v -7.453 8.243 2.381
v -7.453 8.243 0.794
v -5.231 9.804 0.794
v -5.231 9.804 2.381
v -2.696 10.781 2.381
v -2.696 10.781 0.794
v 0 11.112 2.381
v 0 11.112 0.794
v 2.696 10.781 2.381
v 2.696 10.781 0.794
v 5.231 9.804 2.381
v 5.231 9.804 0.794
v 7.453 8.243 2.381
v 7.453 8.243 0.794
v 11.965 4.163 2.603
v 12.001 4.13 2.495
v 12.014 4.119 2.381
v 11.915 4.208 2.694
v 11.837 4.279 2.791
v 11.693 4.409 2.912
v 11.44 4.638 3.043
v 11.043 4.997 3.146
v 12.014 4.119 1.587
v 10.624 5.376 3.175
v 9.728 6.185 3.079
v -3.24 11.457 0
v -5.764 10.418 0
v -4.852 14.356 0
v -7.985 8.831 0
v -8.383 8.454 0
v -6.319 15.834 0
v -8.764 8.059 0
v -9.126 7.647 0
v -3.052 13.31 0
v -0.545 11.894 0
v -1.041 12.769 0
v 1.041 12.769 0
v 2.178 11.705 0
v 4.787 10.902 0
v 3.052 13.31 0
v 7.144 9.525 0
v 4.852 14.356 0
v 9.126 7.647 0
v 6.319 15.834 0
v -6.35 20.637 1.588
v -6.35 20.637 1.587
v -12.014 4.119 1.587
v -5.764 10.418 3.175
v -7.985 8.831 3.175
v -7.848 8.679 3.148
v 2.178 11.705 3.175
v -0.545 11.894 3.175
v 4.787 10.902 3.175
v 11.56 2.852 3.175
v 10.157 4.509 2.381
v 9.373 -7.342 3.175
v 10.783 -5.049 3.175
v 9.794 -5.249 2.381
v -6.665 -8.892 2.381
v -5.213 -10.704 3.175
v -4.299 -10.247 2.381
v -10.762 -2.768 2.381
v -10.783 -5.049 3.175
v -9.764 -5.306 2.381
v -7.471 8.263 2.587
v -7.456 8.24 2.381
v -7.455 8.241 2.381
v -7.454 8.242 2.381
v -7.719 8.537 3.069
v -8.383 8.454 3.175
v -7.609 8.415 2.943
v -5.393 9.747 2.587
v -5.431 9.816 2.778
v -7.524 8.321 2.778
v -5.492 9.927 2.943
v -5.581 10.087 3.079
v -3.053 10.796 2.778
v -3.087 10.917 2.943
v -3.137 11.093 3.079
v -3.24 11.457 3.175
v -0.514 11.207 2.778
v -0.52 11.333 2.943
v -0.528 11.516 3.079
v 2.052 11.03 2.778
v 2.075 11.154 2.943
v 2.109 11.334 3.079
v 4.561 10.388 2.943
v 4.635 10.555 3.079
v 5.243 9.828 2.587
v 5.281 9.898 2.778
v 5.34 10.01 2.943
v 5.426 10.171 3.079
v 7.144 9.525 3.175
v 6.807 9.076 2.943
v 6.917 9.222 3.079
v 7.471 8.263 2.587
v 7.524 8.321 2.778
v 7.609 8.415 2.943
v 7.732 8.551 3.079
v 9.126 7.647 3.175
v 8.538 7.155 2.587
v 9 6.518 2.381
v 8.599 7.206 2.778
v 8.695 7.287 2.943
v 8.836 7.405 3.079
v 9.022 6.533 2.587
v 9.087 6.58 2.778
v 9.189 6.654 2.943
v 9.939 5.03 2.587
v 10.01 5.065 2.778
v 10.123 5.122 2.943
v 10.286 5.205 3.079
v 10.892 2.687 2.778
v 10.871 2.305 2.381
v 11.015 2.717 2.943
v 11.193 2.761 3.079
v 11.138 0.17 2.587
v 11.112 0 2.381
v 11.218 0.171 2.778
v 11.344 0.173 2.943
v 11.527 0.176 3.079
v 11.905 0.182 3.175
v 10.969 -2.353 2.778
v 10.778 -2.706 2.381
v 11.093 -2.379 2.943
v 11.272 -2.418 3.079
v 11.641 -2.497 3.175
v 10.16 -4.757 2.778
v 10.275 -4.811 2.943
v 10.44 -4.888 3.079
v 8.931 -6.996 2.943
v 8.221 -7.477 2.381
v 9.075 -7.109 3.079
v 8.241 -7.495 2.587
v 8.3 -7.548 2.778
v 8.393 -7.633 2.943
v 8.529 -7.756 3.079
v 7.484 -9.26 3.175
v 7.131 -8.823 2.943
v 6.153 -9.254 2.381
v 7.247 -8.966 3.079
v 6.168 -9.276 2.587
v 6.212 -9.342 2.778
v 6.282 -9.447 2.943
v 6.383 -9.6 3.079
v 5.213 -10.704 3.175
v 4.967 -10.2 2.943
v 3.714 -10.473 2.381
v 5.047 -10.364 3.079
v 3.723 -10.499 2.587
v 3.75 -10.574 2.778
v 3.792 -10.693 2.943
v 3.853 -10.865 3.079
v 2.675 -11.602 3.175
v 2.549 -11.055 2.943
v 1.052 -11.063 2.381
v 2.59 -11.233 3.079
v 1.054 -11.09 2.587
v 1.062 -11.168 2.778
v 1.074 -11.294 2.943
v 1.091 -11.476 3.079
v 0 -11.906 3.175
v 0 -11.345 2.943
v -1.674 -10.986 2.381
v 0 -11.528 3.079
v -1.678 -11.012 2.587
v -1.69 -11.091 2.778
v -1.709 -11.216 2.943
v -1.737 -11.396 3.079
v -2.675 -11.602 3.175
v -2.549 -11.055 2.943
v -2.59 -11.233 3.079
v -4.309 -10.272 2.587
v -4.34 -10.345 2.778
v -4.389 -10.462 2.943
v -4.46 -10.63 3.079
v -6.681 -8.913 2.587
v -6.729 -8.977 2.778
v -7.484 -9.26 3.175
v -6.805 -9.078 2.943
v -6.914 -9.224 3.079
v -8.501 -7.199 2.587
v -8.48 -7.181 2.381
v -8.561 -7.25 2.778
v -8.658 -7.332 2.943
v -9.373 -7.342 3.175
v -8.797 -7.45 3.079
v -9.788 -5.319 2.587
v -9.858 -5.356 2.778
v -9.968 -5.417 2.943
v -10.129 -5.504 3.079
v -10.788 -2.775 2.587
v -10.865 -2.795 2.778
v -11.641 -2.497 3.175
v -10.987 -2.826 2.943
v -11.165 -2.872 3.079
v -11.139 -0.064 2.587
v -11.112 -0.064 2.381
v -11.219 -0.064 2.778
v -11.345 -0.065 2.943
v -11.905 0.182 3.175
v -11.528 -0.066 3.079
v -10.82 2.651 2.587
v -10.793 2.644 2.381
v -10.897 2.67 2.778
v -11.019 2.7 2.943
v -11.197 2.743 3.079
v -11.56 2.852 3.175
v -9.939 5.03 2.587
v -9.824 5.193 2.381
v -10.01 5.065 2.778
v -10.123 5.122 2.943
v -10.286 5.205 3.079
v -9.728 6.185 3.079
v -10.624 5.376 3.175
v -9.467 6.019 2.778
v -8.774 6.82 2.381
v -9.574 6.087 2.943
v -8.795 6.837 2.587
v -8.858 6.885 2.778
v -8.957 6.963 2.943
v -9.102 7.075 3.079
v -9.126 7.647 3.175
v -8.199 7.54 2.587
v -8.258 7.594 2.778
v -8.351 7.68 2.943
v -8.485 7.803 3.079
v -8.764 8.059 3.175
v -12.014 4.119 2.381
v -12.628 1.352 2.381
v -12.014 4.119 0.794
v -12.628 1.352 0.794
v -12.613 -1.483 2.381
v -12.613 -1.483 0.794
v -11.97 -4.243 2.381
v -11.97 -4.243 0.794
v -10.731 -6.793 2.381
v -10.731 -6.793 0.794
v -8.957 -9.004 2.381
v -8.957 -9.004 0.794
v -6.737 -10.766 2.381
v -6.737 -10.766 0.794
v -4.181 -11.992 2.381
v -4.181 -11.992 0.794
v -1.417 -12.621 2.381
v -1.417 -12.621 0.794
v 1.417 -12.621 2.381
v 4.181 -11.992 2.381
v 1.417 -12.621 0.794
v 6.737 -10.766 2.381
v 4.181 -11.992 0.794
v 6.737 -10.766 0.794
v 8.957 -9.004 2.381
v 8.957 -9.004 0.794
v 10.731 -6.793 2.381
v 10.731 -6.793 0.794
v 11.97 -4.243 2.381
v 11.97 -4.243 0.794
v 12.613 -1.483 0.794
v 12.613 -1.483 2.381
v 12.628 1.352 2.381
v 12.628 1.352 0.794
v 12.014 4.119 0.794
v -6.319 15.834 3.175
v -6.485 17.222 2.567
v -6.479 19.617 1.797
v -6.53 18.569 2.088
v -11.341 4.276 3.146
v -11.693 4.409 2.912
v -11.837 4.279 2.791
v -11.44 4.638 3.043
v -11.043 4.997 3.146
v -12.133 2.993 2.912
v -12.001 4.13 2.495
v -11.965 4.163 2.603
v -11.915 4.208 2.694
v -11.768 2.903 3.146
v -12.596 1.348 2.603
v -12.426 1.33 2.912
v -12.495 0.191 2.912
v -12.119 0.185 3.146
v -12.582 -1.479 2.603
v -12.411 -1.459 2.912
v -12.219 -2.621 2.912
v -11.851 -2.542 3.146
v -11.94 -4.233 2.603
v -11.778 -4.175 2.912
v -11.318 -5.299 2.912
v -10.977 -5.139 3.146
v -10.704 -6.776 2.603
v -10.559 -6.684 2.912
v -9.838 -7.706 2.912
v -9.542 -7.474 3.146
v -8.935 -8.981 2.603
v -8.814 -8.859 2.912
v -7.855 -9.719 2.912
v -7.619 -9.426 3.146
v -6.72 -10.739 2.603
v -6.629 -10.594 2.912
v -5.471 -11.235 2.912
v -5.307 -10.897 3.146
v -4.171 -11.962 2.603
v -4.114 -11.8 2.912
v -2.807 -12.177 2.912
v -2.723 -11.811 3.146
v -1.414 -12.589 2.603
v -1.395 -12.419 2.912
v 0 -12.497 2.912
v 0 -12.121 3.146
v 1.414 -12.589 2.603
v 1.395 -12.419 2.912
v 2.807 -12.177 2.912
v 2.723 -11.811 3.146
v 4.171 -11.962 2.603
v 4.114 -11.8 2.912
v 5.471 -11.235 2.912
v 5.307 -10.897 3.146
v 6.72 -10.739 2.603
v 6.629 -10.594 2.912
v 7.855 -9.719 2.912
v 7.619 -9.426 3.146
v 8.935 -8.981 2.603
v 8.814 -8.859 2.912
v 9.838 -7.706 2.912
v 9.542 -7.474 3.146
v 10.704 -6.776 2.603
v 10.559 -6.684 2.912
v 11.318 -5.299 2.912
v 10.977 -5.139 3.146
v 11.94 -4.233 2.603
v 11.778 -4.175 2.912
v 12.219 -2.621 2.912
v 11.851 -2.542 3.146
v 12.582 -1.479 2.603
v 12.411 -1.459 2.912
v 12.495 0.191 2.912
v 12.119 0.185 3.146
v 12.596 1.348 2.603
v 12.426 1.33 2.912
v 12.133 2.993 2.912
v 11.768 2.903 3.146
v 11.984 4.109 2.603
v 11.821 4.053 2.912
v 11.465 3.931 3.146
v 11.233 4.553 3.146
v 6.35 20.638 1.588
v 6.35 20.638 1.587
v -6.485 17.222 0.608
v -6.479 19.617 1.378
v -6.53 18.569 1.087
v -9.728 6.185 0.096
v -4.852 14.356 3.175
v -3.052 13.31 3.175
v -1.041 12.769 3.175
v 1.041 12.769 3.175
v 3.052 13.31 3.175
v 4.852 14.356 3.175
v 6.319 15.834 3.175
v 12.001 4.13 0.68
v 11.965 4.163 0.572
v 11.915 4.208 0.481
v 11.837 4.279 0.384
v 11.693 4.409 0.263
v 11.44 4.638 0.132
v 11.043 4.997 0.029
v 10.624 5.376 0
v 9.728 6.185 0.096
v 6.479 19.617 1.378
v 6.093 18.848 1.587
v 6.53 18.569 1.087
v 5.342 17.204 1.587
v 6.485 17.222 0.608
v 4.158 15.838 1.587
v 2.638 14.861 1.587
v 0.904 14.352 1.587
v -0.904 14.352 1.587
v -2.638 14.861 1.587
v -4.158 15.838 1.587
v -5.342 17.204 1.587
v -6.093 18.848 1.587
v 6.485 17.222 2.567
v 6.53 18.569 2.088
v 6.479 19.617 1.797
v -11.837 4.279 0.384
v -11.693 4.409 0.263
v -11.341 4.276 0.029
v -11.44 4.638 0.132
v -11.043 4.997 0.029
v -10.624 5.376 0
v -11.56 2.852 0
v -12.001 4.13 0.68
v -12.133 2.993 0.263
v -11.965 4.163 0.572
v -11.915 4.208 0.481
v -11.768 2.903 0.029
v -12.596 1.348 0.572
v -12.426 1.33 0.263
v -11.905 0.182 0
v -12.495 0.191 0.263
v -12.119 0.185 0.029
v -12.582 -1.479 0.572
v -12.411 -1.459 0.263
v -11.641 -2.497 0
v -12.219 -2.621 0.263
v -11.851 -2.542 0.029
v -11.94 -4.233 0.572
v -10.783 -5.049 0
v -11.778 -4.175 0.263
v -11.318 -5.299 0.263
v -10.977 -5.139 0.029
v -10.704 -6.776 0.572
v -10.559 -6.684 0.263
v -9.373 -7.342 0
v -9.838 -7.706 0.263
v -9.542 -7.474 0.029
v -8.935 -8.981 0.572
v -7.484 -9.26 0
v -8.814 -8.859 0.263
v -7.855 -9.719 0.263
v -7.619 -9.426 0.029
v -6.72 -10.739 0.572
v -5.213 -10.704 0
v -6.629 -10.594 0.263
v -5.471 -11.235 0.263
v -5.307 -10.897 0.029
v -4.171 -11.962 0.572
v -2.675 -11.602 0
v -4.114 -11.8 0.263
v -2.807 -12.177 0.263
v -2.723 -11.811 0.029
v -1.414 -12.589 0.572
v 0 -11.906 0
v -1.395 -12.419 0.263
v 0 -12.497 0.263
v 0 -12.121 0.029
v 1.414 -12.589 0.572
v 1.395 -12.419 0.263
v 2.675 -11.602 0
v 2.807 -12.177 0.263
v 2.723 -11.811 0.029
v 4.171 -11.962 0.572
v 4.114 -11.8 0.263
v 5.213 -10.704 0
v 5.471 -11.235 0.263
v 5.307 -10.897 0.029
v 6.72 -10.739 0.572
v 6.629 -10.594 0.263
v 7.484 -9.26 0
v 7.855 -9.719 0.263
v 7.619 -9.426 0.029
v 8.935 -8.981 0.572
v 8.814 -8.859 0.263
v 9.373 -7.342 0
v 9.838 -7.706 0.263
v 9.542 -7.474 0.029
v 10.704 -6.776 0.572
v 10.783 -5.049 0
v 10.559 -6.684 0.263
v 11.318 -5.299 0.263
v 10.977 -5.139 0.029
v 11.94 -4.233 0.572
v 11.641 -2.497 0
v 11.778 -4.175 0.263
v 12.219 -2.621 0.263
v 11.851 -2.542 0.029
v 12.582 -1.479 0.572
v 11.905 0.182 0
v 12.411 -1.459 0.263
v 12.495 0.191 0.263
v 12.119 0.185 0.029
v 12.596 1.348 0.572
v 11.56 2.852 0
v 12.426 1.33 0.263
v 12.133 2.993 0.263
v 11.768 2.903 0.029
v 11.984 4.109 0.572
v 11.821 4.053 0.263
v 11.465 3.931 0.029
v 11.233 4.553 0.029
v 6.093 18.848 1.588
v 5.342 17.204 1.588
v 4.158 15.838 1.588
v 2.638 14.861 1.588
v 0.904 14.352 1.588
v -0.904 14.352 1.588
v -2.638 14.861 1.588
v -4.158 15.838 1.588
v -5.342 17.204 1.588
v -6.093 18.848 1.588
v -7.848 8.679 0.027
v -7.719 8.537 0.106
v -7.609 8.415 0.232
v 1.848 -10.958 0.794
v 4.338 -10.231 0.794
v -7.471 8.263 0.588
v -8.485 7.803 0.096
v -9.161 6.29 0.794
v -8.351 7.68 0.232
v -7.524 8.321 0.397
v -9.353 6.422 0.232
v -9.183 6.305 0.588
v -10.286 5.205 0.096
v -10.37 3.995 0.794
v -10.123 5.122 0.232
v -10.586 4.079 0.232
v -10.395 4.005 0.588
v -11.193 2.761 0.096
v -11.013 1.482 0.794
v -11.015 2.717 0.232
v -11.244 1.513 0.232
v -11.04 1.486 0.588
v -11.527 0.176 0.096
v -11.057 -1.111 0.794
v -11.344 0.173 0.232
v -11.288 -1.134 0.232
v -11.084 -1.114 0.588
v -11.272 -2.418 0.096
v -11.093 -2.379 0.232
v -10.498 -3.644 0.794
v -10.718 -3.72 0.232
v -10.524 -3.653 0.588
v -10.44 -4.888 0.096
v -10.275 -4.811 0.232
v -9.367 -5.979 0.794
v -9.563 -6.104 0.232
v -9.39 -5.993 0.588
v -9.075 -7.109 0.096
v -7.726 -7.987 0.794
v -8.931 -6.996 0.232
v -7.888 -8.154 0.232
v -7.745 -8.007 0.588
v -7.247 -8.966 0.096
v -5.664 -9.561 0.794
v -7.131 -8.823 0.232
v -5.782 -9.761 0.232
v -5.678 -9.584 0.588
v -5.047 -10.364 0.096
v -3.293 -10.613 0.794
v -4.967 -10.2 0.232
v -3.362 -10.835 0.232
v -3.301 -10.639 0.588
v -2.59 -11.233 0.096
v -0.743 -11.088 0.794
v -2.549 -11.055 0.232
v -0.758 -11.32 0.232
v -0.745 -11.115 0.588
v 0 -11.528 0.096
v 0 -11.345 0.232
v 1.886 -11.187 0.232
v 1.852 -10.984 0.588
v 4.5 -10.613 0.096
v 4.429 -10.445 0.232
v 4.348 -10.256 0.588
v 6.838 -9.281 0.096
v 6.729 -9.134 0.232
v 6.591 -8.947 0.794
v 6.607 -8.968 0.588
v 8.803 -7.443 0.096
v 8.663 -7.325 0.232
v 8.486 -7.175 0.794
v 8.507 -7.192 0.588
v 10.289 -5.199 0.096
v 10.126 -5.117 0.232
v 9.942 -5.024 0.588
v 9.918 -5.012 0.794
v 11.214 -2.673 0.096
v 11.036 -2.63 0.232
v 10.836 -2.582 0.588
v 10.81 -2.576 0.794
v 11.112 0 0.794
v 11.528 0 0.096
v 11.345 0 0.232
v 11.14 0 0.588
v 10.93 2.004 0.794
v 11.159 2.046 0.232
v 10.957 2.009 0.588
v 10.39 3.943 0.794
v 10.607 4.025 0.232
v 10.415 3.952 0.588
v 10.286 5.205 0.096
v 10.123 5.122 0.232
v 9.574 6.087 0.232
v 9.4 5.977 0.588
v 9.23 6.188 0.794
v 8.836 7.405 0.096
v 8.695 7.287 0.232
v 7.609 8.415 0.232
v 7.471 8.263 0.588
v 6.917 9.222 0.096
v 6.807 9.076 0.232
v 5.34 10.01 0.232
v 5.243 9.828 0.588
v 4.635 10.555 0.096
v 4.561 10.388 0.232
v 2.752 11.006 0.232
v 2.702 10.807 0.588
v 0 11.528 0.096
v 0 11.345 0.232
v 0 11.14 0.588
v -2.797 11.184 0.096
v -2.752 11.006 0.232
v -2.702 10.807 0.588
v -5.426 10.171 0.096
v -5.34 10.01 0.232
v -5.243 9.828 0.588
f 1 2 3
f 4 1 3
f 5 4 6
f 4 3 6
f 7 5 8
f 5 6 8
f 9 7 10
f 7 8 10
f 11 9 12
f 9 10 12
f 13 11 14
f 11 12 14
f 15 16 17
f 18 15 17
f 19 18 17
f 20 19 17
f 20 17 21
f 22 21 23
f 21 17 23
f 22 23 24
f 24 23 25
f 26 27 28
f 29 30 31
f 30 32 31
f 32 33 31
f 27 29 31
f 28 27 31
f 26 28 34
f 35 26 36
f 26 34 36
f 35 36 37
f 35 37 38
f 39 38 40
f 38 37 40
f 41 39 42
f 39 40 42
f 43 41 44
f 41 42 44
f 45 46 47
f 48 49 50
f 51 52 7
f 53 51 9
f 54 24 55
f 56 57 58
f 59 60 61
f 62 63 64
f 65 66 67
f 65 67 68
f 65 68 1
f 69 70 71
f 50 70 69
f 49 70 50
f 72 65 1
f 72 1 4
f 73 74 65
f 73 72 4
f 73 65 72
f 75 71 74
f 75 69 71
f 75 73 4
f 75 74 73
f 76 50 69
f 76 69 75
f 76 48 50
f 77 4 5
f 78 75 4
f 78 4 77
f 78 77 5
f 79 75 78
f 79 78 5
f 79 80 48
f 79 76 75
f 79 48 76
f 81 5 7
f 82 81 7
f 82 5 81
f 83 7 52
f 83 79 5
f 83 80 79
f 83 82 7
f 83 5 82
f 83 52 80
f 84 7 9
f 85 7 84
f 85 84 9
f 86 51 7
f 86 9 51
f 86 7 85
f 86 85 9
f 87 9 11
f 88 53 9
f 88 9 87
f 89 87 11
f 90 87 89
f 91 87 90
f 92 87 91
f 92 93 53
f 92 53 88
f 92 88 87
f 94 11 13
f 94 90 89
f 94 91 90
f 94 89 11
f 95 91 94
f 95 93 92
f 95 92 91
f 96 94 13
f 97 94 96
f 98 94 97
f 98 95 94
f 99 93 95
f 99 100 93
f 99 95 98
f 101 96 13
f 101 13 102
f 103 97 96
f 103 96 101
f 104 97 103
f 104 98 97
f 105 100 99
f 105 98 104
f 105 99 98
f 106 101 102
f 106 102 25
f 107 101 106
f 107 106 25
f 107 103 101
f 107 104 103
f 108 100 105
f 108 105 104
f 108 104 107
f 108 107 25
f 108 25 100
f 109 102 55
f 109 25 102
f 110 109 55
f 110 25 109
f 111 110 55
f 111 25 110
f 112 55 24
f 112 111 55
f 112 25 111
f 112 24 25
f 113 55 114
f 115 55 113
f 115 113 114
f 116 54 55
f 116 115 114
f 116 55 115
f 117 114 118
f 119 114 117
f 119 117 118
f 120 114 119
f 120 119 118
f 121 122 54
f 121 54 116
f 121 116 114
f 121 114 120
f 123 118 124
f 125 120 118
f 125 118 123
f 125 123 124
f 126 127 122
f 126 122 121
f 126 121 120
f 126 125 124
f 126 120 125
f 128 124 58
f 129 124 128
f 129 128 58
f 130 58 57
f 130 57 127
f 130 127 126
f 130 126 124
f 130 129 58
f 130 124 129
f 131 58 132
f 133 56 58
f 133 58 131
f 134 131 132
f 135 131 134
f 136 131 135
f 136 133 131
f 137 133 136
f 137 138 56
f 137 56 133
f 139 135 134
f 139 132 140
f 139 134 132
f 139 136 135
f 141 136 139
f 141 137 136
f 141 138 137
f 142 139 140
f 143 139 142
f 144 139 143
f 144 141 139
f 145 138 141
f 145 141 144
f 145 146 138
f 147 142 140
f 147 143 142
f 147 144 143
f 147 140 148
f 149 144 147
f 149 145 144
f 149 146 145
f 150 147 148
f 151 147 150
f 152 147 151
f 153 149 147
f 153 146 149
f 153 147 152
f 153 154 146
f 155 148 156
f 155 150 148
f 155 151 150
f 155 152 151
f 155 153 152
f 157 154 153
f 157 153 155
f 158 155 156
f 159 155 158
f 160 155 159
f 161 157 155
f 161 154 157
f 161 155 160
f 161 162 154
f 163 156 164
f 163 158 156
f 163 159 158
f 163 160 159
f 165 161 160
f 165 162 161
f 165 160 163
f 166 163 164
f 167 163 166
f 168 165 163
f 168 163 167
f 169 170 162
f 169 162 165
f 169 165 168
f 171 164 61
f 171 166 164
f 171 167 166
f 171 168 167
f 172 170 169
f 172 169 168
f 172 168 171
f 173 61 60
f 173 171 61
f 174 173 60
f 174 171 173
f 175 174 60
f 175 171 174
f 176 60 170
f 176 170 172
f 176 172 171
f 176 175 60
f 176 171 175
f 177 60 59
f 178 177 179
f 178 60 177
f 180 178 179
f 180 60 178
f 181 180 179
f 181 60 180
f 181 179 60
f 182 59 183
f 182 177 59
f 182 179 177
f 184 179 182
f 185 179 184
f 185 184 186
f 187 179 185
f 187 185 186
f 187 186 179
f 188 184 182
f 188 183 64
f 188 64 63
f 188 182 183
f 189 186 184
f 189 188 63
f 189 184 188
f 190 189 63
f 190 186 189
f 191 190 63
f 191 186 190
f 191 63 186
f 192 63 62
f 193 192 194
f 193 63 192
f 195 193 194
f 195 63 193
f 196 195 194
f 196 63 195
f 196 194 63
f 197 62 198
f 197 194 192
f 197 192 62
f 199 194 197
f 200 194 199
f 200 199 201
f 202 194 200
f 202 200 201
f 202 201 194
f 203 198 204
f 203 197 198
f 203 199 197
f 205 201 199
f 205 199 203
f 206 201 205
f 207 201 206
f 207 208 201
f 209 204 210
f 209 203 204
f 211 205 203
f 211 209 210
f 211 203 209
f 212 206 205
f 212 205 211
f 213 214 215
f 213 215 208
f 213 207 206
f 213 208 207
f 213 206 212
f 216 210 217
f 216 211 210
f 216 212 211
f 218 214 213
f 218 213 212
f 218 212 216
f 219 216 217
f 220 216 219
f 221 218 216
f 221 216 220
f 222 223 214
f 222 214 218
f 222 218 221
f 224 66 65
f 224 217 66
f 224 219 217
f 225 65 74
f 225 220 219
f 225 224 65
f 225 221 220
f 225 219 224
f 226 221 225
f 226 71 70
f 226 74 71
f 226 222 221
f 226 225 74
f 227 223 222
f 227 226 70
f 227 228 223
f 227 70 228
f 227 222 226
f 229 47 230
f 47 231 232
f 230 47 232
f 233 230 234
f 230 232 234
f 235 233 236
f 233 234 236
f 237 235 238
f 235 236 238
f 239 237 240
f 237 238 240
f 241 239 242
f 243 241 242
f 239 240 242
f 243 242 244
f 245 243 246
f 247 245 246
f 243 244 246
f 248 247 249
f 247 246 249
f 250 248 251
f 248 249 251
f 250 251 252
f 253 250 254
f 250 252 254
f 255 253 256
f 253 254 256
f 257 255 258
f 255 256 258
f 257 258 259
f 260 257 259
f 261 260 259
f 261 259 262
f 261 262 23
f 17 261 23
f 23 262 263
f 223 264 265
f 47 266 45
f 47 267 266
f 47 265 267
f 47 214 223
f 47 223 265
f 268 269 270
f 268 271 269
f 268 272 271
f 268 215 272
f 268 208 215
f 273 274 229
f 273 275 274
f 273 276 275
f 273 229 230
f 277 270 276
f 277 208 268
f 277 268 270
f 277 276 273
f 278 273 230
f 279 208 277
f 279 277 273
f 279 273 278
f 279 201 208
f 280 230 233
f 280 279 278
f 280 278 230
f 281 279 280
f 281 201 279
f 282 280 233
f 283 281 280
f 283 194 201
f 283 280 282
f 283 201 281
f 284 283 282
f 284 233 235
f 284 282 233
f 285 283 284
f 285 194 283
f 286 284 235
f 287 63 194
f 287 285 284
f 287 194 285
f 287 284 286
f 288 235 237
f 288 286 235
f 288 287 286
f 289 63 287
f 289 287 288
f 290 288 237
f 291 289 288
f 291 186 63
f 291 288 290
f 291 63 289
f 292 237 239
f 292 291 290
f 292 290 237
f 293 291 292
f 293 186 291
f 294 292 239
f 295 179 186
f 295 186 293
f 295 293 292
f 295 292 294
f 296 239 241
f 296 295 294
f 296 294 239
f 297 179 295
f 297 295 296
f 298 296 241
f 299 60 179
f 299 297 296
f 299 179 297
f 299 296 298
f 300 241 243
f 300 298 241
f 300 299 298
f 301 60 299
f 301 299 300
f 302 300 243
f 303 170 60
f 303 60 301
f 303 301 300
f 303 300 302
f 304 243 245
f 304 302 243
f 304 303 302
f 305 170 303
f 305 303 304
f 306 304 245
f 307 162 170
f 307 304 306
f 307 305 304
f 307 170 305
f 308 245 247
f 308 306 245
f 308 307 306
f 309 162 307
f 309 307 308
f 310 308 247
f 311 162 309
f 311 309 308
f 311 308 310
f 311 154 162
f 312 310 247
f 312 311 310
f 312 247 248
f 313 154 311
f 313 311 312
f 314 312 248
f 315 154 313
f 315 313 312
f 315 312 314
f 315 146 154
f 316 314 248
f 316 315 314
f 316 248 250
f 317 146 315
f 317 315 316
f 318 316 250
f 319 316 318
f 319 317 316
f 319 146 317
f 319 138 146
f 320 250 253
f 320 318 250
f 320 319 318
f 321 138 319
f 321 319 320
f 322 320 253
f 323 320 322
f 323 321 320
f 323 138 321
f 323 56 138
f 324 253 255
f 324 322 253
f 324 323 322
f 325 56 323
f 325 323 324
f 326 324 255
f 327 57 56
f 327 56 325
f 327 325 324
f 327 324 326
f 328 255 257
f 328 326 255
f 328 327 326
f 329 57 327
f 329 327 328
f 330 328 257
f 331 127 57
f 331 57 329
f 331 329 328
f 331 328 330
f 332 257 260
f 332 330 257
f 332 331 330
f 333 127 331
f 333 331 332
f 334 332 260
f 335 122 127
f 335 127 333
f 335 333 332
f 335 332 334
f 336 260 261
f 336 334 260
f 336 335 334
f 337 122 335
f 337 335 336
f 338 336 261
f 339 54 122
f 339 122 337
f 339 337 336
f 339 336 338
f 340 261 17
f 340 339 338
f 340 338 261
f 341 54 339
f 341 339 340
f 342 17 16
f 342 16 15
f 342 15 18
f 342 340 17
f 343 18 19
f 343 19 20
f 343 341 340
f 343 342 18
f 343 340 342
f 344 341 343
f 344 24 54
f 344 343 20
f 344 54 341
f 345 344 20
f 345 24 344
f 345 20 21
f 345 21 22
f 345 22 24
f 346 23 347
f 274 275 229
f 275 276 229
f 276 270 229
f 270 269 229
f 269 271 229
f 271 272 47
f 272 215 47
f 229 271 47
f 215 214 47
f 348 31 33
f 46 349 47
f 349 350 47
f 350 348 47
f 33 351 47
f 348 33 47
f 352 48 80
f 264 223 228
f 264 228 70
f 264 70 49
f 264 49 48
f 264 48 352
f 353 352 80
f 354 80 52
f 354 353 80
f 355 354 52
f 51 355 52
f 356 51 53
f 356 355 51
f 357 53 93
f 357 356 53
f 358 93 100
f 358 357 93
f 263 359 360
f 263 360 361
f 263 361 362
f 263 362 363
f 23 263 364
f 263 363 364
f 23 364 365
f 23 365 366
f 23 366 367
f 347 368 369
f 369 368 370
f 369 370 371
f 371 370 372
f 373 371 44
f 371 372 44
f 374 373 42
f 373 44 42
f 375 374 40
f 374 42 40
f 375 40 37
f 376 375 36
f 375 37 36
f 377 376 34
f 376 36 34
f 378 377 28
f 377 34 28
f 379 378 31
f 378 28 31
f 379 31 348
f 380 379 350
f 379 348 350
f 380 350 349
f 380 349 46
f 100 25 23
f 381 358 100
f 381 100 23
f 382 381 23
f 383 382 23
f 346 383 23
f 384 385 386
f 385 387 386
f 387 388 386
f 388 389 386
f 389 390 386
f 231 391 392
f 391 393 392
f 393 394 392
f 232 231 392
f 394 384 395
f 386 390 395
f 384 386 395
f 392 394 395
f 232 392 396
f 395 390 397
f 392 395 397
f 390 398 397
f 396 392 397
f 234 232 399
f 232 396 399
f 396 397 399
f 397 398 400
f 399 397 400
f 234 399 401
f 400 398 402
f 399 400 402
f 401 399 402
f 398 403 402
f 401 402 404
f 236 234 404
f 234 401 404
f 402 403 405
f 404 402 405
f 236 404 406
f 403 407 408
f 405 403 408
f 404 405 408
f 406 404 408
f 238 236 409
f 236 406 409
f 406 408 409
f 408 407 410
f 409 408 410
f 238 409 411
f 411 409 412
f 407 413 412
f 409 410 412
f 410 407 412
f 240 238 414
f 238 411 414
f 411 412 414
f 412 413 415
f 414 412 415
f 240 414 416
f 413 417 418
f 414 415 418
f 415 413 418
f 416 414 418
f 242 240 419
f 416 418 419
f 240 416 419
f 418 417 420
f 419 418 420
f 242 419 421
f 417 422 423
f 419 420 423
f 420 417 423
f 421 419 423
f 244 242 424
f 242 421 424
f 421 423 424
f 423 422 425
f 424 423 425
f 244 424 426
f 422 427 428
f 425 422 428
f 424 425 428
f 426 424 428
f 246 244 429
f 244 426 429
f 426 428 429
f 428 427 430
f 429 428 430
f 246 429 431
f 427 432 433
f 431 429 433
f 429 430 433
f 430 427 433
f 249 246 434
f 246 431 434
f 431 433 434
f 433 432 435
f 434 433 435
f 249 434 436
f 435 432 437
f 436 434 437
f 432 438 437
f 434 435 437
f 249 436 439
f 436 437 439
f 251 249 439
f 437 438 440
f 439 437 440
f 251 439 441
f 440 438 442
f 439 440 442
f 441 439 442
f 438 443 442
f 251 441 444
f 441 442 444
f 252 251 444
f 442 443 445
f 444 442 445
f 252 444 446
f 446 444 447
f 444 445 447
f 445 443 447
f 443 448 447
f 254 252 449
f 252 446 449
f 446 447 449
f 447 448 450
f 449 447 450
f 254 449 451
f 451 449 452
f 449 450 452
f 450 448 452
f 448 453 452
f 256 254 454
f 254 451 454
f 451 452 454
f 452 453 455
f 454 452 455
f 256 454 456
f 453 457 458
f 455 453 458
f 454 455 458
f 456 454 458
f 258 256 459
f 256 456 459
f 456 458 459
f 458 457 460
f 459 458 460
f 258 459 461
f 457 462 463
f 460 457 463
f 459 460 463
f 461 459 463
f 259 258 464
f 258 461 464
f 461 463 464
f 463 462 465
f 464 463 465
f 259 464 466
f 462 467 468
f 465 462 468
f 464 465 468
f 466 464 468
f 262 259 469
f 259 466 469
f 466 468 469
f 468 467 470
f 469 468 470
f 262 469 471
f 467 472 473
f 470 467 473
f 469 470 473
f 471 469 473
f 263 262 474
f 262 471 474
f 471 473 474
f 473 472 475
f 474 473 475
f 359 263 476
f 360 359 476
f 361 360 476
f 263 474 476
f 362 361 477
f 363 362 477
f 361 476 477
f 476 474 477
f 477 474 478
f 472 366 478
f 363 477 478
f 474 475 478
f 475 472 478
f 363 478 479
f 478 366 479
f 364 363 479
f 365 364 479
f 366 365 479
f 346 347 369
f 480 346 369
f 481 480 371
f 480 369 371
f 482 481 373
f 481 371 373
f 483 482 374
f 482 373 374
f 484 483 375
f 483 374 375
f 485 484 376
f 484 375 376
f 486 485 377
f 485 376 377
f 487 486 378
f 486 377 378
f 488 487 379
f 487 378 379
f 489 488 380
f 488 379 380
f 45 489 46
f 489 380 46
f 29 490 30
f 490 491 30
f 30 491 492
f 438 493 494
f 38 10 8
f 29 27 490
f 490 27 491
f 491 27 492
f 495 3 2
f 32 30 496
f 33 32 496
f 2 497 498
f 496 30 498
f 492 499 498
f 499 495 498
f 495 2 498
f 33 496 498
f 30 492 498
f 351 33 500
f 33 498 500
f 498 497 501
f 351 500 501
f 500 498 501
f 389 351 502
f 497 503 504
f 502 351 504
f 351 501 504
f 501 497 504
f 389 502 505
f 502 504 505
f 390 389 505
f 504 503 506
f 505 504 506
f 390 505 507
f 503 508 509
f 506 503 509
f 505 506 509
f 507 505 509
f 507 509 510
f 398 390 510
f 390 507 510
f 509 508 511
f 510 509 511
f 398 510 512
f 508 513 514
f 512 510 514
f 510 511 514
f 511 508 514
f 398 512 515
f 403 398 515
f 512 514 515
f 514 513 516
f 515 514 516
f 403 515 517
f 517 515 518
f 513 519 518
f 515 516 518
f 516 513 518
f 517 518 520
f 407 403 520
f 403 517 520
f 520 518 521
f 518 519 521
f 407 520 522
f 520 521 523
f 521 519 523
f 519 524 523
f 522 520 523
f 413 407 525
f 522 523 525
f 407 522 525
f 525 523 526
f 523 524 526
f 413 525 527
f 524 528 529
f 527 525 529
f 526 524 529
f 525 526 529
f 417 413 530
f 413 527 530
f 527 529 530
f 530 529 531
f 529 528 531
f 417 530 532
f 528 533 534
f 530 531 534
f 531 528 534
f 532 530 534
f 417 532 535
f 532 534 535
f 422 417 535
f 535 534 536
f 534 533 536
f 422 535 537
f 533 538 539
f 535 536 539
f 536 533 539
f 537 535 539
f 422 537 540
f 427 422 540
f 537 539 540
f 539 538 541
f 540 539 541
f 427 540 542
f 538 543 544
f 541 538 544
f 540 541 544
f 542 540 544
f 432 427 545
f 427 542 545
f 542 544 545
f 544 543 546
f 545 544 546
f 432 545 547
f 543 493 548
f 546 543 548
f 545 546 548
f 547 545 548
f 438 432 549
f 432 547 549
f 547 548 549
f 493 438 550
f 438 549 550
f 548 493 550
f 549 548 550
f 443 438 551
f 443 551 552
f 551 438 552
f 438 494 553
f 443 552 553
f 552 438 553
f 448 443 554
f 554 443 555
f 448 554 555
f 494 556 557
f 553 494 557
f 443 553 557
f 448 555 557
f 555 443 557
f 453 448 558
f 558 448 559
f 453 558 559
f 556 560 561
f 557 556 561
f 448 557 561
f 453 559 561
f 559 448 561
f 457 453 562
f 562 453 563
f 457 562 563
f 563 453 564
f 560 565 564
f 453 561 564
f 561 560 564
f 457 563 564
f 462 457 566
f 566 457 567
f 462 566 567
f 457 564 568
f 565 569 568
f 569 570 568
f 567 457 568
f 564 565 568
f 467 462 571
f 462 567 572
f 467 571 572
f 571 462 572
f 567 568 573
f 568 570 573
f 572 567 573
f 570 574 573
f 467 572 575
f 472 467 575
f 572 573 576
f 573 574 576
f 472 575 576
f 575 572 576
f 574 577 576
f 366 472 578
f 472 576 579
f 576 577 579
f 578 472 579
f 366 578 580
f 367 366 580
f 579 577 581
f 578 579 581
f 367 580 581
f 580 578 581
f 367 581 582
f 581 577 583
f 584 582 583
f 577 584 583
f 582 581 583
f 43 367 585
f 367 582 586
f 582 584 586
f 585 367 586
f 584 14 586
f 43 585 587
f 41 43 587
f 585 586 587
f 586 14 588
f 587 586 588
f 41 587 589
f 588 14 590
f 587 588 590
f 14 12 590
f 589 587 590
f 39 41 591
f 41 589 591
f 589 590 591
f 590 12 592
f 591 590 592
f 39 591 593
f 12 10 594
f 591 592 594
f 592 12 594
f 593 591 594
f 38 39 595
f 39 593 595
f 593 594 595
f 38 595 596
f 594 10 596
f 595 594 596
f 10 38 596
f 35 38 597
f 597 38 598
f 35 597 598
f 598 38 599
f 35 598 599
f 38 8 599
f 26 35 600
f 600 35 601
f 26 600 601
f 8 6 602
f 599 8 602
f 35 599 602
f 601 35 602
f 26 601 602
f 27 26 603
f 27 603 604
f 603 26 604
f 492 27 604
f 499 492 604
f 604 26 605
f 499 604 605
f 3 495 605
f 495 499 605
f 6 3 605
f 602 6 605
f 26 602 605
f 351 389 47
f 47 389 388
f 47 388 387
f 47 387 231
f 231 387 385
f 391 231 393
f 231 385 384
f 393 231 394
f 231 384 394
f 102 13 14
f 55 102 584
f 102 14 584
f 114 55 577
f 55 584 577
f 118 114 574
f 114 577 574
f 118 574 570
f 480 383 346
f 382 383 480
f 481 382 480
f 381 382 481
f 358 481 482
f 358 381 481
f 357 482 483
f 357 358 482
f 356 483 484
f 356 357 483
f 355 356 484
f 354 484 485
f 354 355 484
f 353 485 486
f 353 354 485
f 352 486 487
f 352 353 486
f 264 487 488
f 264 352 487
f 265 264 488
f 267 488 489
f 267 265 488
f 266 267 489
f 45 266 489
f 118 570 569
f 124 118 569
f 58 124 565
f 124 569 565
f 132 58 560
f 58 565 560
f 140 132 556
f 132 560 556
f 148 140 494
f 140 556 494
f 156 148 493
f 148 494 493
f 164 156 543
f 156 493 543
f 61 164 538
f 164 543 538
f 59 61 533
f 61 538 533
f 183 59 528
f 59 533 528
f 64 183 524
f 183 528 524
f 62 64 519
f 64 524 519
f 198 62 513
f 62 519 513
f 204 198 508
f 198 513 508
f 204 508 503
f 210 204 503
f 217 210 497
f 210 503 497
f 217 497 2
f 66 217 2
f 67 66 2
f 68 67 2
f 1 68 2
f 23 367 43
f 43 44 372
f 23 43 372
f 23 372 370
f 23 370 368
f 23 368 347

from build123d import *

# Parameters (mm, degrees)
F1_DEPTH    = 3.175
F2_SIZE     = 1.58749
F3_DEPTH    = 3.175
F4_T6_ANGLE = 235.7964191348
F4_T8_ANGLE = 235.7964191348


# Not quite as in the source:
# - a fillet or chamfer that OpenCascade refuses, or shapes differently, is made with other operations: its cross-section is extruded or revolved along the edge and cut away or added
# - a fillet or chamfer is up to 0.001 mm smaller than in the source, because OpenCascade refuses the exact size


with BuildPart() as f1:
    # F0 (on Top) → F1 (new body)
    with BuildSketch(Plane.XY):
        with BuildLine():
            ThreePointArc((-7.4530411175, 8.2425623656), (0, 11.1125), (7.4530411175, 8.2425623656))
            Line((7.4530411175, 8.2425623656), (12.0135135135, 4.1189189189))
            Line((12.0135135135, 4.1189189189), (6.35, 20.6375))
            ThreePointArc((6.35, 20.6375), (0, 14.2875), (-6.35, 20.6375))
            Line((-6.35, 20.6375), (-12.0135135135, 4.1189189189))
            Line((-12.0135135135, 4.1189189189), (-7.4530411175, 8.2425623656))
        make_face()
    extrude(amount=F1_DEPTH)

    # F2 (size 1.5875 in the source; OpenCascade refuses exactly that, so slightly less here)
    f2_edges = [f1.edges().sort_by_distance(p)[0] for p in [
        (-9.181757, 12.378209, 3.175),
        (-9.181757, 12.378209, 0),
        (0, 14.2875, 0),
        (0, 14.2875, 3.175),
        (9.181757, 12.378209, 3.175),
        (9.181757, 12.378209, 0),
    ]]
    chamfer(f2_edges, length=F2_SIZE)

    # F0 (on Top) → F3 (join)
    with BuildSketch(Plane.XY):
        with BuildLine():
            ThreePointArc((7.4530411175, 8.2425623656), (10.1565145515, 4.509198201), (11.1125, 0))
            ThreePointArc((11.1125, 0), (-4.509198201, -10.1565145515), (-7.4530411175, 8.2425623656))
            Line((-7.4530411175, 8.2425623656), (-12.0135135135, 4.1189189189))
            ThreePointArc((-12.0135135135, 4.1189189189), (0, -12.7), (12.0135135135, 4.1189189189))
            Line((12.0135135135, 4.1189189189), (7.4530411175, 8.2425623656))
        make_face()
    extrude(amount=F3_DEPTH)

    # F4: fillet of radius 0.79375 on 4 edges, made by hand

    # F4_s1 → F4_t2 (revolve, cut)
    with BuildSketch(Plane(origin=(0, 0, 0), x_dir=(0, 0, 1), z_dir=(-0.7417378957, -0.6706898643, 0))):
        with BuildLine():
            ThreePointArc((2.38125, 11.1125), (2.9425160076, 11.3449839924), (3.175, 11.90625))
            Line((3.175, 11.90625), (3.175, 11.1125))
            Line((3.175, 11.1125), (2.38125, 11.1125))
        make_face()
    revolve(axis=Axis((0, 0, 3.175), (0, 0, -1)), mode=Mode.SUBTRACT)

    # F4_s3 → F4_t4 (revolve, cut)
    with BuildSketch(Plane(origin=(0, 0, 0), x_dir=(0, 0, 1), z_dir=(0.7417378957, 0.6706898643, 0))):
        with BuildLine():
            ThreePointArc((0, -11.90625), (0.2324839924, -11.3449839924), (0.79375, -11.1125))
            Line((0.79375, -11.1125), (0, -11.1125))
            Line((0, -11.1125), (0, -11.90625))
        make_face()
    revolve(axis=Axis((0, 0, 0), (0, 0, 1)), mode=Mode.SUBTRACT)

    # F4_s5 → F4_t6 (revolve, cut)
    with BuildSketch(Plane(origin=(0, 0, 0), x_dir=(0, 0, 1), z_dir=(0.4679021973, 0.883780252, 0))):
        with BuildLine():
            ThreePointArc((0.79375, -12.7), (0.2324839924, -12.4675160076), (0, -11.90625))
            Line((0, -11.90625), (0, -12.7))
            Line((0, -12.7), (0.79375, -12.7))
        make_face()
    revolve(axis=Axis((0, 0, 0), (0, 0, 1)), revolution_arc=F4_T6_ANGLE, mode=Mode.SUBTRACT)

    # F4_s7 → F4_t8 (revolve, cut)
    with BuildSketch(Plane(origin=(0, 0, 0), x_dir=(0, 0, 1), z_dir=(0.4679021973, 0.883780252, 0))):
        with BuildLine():
            ThreePointArc((2.38125, -12.7), (2.9425160076, -12.4675160076), (3.175, -11.90625))
            Line((3.175, -11.90625), (3.175, -12.7))
            Line((3.175, -12.7), (2.38125, -12.7))
        make_face()
    revolve(axis=Axis((0, 0, 3.175), (0, 0, 1)), revolution_arc=F4_T8_ANGLE, mode=Mode.SUBTRACT)


solid = f1.part
